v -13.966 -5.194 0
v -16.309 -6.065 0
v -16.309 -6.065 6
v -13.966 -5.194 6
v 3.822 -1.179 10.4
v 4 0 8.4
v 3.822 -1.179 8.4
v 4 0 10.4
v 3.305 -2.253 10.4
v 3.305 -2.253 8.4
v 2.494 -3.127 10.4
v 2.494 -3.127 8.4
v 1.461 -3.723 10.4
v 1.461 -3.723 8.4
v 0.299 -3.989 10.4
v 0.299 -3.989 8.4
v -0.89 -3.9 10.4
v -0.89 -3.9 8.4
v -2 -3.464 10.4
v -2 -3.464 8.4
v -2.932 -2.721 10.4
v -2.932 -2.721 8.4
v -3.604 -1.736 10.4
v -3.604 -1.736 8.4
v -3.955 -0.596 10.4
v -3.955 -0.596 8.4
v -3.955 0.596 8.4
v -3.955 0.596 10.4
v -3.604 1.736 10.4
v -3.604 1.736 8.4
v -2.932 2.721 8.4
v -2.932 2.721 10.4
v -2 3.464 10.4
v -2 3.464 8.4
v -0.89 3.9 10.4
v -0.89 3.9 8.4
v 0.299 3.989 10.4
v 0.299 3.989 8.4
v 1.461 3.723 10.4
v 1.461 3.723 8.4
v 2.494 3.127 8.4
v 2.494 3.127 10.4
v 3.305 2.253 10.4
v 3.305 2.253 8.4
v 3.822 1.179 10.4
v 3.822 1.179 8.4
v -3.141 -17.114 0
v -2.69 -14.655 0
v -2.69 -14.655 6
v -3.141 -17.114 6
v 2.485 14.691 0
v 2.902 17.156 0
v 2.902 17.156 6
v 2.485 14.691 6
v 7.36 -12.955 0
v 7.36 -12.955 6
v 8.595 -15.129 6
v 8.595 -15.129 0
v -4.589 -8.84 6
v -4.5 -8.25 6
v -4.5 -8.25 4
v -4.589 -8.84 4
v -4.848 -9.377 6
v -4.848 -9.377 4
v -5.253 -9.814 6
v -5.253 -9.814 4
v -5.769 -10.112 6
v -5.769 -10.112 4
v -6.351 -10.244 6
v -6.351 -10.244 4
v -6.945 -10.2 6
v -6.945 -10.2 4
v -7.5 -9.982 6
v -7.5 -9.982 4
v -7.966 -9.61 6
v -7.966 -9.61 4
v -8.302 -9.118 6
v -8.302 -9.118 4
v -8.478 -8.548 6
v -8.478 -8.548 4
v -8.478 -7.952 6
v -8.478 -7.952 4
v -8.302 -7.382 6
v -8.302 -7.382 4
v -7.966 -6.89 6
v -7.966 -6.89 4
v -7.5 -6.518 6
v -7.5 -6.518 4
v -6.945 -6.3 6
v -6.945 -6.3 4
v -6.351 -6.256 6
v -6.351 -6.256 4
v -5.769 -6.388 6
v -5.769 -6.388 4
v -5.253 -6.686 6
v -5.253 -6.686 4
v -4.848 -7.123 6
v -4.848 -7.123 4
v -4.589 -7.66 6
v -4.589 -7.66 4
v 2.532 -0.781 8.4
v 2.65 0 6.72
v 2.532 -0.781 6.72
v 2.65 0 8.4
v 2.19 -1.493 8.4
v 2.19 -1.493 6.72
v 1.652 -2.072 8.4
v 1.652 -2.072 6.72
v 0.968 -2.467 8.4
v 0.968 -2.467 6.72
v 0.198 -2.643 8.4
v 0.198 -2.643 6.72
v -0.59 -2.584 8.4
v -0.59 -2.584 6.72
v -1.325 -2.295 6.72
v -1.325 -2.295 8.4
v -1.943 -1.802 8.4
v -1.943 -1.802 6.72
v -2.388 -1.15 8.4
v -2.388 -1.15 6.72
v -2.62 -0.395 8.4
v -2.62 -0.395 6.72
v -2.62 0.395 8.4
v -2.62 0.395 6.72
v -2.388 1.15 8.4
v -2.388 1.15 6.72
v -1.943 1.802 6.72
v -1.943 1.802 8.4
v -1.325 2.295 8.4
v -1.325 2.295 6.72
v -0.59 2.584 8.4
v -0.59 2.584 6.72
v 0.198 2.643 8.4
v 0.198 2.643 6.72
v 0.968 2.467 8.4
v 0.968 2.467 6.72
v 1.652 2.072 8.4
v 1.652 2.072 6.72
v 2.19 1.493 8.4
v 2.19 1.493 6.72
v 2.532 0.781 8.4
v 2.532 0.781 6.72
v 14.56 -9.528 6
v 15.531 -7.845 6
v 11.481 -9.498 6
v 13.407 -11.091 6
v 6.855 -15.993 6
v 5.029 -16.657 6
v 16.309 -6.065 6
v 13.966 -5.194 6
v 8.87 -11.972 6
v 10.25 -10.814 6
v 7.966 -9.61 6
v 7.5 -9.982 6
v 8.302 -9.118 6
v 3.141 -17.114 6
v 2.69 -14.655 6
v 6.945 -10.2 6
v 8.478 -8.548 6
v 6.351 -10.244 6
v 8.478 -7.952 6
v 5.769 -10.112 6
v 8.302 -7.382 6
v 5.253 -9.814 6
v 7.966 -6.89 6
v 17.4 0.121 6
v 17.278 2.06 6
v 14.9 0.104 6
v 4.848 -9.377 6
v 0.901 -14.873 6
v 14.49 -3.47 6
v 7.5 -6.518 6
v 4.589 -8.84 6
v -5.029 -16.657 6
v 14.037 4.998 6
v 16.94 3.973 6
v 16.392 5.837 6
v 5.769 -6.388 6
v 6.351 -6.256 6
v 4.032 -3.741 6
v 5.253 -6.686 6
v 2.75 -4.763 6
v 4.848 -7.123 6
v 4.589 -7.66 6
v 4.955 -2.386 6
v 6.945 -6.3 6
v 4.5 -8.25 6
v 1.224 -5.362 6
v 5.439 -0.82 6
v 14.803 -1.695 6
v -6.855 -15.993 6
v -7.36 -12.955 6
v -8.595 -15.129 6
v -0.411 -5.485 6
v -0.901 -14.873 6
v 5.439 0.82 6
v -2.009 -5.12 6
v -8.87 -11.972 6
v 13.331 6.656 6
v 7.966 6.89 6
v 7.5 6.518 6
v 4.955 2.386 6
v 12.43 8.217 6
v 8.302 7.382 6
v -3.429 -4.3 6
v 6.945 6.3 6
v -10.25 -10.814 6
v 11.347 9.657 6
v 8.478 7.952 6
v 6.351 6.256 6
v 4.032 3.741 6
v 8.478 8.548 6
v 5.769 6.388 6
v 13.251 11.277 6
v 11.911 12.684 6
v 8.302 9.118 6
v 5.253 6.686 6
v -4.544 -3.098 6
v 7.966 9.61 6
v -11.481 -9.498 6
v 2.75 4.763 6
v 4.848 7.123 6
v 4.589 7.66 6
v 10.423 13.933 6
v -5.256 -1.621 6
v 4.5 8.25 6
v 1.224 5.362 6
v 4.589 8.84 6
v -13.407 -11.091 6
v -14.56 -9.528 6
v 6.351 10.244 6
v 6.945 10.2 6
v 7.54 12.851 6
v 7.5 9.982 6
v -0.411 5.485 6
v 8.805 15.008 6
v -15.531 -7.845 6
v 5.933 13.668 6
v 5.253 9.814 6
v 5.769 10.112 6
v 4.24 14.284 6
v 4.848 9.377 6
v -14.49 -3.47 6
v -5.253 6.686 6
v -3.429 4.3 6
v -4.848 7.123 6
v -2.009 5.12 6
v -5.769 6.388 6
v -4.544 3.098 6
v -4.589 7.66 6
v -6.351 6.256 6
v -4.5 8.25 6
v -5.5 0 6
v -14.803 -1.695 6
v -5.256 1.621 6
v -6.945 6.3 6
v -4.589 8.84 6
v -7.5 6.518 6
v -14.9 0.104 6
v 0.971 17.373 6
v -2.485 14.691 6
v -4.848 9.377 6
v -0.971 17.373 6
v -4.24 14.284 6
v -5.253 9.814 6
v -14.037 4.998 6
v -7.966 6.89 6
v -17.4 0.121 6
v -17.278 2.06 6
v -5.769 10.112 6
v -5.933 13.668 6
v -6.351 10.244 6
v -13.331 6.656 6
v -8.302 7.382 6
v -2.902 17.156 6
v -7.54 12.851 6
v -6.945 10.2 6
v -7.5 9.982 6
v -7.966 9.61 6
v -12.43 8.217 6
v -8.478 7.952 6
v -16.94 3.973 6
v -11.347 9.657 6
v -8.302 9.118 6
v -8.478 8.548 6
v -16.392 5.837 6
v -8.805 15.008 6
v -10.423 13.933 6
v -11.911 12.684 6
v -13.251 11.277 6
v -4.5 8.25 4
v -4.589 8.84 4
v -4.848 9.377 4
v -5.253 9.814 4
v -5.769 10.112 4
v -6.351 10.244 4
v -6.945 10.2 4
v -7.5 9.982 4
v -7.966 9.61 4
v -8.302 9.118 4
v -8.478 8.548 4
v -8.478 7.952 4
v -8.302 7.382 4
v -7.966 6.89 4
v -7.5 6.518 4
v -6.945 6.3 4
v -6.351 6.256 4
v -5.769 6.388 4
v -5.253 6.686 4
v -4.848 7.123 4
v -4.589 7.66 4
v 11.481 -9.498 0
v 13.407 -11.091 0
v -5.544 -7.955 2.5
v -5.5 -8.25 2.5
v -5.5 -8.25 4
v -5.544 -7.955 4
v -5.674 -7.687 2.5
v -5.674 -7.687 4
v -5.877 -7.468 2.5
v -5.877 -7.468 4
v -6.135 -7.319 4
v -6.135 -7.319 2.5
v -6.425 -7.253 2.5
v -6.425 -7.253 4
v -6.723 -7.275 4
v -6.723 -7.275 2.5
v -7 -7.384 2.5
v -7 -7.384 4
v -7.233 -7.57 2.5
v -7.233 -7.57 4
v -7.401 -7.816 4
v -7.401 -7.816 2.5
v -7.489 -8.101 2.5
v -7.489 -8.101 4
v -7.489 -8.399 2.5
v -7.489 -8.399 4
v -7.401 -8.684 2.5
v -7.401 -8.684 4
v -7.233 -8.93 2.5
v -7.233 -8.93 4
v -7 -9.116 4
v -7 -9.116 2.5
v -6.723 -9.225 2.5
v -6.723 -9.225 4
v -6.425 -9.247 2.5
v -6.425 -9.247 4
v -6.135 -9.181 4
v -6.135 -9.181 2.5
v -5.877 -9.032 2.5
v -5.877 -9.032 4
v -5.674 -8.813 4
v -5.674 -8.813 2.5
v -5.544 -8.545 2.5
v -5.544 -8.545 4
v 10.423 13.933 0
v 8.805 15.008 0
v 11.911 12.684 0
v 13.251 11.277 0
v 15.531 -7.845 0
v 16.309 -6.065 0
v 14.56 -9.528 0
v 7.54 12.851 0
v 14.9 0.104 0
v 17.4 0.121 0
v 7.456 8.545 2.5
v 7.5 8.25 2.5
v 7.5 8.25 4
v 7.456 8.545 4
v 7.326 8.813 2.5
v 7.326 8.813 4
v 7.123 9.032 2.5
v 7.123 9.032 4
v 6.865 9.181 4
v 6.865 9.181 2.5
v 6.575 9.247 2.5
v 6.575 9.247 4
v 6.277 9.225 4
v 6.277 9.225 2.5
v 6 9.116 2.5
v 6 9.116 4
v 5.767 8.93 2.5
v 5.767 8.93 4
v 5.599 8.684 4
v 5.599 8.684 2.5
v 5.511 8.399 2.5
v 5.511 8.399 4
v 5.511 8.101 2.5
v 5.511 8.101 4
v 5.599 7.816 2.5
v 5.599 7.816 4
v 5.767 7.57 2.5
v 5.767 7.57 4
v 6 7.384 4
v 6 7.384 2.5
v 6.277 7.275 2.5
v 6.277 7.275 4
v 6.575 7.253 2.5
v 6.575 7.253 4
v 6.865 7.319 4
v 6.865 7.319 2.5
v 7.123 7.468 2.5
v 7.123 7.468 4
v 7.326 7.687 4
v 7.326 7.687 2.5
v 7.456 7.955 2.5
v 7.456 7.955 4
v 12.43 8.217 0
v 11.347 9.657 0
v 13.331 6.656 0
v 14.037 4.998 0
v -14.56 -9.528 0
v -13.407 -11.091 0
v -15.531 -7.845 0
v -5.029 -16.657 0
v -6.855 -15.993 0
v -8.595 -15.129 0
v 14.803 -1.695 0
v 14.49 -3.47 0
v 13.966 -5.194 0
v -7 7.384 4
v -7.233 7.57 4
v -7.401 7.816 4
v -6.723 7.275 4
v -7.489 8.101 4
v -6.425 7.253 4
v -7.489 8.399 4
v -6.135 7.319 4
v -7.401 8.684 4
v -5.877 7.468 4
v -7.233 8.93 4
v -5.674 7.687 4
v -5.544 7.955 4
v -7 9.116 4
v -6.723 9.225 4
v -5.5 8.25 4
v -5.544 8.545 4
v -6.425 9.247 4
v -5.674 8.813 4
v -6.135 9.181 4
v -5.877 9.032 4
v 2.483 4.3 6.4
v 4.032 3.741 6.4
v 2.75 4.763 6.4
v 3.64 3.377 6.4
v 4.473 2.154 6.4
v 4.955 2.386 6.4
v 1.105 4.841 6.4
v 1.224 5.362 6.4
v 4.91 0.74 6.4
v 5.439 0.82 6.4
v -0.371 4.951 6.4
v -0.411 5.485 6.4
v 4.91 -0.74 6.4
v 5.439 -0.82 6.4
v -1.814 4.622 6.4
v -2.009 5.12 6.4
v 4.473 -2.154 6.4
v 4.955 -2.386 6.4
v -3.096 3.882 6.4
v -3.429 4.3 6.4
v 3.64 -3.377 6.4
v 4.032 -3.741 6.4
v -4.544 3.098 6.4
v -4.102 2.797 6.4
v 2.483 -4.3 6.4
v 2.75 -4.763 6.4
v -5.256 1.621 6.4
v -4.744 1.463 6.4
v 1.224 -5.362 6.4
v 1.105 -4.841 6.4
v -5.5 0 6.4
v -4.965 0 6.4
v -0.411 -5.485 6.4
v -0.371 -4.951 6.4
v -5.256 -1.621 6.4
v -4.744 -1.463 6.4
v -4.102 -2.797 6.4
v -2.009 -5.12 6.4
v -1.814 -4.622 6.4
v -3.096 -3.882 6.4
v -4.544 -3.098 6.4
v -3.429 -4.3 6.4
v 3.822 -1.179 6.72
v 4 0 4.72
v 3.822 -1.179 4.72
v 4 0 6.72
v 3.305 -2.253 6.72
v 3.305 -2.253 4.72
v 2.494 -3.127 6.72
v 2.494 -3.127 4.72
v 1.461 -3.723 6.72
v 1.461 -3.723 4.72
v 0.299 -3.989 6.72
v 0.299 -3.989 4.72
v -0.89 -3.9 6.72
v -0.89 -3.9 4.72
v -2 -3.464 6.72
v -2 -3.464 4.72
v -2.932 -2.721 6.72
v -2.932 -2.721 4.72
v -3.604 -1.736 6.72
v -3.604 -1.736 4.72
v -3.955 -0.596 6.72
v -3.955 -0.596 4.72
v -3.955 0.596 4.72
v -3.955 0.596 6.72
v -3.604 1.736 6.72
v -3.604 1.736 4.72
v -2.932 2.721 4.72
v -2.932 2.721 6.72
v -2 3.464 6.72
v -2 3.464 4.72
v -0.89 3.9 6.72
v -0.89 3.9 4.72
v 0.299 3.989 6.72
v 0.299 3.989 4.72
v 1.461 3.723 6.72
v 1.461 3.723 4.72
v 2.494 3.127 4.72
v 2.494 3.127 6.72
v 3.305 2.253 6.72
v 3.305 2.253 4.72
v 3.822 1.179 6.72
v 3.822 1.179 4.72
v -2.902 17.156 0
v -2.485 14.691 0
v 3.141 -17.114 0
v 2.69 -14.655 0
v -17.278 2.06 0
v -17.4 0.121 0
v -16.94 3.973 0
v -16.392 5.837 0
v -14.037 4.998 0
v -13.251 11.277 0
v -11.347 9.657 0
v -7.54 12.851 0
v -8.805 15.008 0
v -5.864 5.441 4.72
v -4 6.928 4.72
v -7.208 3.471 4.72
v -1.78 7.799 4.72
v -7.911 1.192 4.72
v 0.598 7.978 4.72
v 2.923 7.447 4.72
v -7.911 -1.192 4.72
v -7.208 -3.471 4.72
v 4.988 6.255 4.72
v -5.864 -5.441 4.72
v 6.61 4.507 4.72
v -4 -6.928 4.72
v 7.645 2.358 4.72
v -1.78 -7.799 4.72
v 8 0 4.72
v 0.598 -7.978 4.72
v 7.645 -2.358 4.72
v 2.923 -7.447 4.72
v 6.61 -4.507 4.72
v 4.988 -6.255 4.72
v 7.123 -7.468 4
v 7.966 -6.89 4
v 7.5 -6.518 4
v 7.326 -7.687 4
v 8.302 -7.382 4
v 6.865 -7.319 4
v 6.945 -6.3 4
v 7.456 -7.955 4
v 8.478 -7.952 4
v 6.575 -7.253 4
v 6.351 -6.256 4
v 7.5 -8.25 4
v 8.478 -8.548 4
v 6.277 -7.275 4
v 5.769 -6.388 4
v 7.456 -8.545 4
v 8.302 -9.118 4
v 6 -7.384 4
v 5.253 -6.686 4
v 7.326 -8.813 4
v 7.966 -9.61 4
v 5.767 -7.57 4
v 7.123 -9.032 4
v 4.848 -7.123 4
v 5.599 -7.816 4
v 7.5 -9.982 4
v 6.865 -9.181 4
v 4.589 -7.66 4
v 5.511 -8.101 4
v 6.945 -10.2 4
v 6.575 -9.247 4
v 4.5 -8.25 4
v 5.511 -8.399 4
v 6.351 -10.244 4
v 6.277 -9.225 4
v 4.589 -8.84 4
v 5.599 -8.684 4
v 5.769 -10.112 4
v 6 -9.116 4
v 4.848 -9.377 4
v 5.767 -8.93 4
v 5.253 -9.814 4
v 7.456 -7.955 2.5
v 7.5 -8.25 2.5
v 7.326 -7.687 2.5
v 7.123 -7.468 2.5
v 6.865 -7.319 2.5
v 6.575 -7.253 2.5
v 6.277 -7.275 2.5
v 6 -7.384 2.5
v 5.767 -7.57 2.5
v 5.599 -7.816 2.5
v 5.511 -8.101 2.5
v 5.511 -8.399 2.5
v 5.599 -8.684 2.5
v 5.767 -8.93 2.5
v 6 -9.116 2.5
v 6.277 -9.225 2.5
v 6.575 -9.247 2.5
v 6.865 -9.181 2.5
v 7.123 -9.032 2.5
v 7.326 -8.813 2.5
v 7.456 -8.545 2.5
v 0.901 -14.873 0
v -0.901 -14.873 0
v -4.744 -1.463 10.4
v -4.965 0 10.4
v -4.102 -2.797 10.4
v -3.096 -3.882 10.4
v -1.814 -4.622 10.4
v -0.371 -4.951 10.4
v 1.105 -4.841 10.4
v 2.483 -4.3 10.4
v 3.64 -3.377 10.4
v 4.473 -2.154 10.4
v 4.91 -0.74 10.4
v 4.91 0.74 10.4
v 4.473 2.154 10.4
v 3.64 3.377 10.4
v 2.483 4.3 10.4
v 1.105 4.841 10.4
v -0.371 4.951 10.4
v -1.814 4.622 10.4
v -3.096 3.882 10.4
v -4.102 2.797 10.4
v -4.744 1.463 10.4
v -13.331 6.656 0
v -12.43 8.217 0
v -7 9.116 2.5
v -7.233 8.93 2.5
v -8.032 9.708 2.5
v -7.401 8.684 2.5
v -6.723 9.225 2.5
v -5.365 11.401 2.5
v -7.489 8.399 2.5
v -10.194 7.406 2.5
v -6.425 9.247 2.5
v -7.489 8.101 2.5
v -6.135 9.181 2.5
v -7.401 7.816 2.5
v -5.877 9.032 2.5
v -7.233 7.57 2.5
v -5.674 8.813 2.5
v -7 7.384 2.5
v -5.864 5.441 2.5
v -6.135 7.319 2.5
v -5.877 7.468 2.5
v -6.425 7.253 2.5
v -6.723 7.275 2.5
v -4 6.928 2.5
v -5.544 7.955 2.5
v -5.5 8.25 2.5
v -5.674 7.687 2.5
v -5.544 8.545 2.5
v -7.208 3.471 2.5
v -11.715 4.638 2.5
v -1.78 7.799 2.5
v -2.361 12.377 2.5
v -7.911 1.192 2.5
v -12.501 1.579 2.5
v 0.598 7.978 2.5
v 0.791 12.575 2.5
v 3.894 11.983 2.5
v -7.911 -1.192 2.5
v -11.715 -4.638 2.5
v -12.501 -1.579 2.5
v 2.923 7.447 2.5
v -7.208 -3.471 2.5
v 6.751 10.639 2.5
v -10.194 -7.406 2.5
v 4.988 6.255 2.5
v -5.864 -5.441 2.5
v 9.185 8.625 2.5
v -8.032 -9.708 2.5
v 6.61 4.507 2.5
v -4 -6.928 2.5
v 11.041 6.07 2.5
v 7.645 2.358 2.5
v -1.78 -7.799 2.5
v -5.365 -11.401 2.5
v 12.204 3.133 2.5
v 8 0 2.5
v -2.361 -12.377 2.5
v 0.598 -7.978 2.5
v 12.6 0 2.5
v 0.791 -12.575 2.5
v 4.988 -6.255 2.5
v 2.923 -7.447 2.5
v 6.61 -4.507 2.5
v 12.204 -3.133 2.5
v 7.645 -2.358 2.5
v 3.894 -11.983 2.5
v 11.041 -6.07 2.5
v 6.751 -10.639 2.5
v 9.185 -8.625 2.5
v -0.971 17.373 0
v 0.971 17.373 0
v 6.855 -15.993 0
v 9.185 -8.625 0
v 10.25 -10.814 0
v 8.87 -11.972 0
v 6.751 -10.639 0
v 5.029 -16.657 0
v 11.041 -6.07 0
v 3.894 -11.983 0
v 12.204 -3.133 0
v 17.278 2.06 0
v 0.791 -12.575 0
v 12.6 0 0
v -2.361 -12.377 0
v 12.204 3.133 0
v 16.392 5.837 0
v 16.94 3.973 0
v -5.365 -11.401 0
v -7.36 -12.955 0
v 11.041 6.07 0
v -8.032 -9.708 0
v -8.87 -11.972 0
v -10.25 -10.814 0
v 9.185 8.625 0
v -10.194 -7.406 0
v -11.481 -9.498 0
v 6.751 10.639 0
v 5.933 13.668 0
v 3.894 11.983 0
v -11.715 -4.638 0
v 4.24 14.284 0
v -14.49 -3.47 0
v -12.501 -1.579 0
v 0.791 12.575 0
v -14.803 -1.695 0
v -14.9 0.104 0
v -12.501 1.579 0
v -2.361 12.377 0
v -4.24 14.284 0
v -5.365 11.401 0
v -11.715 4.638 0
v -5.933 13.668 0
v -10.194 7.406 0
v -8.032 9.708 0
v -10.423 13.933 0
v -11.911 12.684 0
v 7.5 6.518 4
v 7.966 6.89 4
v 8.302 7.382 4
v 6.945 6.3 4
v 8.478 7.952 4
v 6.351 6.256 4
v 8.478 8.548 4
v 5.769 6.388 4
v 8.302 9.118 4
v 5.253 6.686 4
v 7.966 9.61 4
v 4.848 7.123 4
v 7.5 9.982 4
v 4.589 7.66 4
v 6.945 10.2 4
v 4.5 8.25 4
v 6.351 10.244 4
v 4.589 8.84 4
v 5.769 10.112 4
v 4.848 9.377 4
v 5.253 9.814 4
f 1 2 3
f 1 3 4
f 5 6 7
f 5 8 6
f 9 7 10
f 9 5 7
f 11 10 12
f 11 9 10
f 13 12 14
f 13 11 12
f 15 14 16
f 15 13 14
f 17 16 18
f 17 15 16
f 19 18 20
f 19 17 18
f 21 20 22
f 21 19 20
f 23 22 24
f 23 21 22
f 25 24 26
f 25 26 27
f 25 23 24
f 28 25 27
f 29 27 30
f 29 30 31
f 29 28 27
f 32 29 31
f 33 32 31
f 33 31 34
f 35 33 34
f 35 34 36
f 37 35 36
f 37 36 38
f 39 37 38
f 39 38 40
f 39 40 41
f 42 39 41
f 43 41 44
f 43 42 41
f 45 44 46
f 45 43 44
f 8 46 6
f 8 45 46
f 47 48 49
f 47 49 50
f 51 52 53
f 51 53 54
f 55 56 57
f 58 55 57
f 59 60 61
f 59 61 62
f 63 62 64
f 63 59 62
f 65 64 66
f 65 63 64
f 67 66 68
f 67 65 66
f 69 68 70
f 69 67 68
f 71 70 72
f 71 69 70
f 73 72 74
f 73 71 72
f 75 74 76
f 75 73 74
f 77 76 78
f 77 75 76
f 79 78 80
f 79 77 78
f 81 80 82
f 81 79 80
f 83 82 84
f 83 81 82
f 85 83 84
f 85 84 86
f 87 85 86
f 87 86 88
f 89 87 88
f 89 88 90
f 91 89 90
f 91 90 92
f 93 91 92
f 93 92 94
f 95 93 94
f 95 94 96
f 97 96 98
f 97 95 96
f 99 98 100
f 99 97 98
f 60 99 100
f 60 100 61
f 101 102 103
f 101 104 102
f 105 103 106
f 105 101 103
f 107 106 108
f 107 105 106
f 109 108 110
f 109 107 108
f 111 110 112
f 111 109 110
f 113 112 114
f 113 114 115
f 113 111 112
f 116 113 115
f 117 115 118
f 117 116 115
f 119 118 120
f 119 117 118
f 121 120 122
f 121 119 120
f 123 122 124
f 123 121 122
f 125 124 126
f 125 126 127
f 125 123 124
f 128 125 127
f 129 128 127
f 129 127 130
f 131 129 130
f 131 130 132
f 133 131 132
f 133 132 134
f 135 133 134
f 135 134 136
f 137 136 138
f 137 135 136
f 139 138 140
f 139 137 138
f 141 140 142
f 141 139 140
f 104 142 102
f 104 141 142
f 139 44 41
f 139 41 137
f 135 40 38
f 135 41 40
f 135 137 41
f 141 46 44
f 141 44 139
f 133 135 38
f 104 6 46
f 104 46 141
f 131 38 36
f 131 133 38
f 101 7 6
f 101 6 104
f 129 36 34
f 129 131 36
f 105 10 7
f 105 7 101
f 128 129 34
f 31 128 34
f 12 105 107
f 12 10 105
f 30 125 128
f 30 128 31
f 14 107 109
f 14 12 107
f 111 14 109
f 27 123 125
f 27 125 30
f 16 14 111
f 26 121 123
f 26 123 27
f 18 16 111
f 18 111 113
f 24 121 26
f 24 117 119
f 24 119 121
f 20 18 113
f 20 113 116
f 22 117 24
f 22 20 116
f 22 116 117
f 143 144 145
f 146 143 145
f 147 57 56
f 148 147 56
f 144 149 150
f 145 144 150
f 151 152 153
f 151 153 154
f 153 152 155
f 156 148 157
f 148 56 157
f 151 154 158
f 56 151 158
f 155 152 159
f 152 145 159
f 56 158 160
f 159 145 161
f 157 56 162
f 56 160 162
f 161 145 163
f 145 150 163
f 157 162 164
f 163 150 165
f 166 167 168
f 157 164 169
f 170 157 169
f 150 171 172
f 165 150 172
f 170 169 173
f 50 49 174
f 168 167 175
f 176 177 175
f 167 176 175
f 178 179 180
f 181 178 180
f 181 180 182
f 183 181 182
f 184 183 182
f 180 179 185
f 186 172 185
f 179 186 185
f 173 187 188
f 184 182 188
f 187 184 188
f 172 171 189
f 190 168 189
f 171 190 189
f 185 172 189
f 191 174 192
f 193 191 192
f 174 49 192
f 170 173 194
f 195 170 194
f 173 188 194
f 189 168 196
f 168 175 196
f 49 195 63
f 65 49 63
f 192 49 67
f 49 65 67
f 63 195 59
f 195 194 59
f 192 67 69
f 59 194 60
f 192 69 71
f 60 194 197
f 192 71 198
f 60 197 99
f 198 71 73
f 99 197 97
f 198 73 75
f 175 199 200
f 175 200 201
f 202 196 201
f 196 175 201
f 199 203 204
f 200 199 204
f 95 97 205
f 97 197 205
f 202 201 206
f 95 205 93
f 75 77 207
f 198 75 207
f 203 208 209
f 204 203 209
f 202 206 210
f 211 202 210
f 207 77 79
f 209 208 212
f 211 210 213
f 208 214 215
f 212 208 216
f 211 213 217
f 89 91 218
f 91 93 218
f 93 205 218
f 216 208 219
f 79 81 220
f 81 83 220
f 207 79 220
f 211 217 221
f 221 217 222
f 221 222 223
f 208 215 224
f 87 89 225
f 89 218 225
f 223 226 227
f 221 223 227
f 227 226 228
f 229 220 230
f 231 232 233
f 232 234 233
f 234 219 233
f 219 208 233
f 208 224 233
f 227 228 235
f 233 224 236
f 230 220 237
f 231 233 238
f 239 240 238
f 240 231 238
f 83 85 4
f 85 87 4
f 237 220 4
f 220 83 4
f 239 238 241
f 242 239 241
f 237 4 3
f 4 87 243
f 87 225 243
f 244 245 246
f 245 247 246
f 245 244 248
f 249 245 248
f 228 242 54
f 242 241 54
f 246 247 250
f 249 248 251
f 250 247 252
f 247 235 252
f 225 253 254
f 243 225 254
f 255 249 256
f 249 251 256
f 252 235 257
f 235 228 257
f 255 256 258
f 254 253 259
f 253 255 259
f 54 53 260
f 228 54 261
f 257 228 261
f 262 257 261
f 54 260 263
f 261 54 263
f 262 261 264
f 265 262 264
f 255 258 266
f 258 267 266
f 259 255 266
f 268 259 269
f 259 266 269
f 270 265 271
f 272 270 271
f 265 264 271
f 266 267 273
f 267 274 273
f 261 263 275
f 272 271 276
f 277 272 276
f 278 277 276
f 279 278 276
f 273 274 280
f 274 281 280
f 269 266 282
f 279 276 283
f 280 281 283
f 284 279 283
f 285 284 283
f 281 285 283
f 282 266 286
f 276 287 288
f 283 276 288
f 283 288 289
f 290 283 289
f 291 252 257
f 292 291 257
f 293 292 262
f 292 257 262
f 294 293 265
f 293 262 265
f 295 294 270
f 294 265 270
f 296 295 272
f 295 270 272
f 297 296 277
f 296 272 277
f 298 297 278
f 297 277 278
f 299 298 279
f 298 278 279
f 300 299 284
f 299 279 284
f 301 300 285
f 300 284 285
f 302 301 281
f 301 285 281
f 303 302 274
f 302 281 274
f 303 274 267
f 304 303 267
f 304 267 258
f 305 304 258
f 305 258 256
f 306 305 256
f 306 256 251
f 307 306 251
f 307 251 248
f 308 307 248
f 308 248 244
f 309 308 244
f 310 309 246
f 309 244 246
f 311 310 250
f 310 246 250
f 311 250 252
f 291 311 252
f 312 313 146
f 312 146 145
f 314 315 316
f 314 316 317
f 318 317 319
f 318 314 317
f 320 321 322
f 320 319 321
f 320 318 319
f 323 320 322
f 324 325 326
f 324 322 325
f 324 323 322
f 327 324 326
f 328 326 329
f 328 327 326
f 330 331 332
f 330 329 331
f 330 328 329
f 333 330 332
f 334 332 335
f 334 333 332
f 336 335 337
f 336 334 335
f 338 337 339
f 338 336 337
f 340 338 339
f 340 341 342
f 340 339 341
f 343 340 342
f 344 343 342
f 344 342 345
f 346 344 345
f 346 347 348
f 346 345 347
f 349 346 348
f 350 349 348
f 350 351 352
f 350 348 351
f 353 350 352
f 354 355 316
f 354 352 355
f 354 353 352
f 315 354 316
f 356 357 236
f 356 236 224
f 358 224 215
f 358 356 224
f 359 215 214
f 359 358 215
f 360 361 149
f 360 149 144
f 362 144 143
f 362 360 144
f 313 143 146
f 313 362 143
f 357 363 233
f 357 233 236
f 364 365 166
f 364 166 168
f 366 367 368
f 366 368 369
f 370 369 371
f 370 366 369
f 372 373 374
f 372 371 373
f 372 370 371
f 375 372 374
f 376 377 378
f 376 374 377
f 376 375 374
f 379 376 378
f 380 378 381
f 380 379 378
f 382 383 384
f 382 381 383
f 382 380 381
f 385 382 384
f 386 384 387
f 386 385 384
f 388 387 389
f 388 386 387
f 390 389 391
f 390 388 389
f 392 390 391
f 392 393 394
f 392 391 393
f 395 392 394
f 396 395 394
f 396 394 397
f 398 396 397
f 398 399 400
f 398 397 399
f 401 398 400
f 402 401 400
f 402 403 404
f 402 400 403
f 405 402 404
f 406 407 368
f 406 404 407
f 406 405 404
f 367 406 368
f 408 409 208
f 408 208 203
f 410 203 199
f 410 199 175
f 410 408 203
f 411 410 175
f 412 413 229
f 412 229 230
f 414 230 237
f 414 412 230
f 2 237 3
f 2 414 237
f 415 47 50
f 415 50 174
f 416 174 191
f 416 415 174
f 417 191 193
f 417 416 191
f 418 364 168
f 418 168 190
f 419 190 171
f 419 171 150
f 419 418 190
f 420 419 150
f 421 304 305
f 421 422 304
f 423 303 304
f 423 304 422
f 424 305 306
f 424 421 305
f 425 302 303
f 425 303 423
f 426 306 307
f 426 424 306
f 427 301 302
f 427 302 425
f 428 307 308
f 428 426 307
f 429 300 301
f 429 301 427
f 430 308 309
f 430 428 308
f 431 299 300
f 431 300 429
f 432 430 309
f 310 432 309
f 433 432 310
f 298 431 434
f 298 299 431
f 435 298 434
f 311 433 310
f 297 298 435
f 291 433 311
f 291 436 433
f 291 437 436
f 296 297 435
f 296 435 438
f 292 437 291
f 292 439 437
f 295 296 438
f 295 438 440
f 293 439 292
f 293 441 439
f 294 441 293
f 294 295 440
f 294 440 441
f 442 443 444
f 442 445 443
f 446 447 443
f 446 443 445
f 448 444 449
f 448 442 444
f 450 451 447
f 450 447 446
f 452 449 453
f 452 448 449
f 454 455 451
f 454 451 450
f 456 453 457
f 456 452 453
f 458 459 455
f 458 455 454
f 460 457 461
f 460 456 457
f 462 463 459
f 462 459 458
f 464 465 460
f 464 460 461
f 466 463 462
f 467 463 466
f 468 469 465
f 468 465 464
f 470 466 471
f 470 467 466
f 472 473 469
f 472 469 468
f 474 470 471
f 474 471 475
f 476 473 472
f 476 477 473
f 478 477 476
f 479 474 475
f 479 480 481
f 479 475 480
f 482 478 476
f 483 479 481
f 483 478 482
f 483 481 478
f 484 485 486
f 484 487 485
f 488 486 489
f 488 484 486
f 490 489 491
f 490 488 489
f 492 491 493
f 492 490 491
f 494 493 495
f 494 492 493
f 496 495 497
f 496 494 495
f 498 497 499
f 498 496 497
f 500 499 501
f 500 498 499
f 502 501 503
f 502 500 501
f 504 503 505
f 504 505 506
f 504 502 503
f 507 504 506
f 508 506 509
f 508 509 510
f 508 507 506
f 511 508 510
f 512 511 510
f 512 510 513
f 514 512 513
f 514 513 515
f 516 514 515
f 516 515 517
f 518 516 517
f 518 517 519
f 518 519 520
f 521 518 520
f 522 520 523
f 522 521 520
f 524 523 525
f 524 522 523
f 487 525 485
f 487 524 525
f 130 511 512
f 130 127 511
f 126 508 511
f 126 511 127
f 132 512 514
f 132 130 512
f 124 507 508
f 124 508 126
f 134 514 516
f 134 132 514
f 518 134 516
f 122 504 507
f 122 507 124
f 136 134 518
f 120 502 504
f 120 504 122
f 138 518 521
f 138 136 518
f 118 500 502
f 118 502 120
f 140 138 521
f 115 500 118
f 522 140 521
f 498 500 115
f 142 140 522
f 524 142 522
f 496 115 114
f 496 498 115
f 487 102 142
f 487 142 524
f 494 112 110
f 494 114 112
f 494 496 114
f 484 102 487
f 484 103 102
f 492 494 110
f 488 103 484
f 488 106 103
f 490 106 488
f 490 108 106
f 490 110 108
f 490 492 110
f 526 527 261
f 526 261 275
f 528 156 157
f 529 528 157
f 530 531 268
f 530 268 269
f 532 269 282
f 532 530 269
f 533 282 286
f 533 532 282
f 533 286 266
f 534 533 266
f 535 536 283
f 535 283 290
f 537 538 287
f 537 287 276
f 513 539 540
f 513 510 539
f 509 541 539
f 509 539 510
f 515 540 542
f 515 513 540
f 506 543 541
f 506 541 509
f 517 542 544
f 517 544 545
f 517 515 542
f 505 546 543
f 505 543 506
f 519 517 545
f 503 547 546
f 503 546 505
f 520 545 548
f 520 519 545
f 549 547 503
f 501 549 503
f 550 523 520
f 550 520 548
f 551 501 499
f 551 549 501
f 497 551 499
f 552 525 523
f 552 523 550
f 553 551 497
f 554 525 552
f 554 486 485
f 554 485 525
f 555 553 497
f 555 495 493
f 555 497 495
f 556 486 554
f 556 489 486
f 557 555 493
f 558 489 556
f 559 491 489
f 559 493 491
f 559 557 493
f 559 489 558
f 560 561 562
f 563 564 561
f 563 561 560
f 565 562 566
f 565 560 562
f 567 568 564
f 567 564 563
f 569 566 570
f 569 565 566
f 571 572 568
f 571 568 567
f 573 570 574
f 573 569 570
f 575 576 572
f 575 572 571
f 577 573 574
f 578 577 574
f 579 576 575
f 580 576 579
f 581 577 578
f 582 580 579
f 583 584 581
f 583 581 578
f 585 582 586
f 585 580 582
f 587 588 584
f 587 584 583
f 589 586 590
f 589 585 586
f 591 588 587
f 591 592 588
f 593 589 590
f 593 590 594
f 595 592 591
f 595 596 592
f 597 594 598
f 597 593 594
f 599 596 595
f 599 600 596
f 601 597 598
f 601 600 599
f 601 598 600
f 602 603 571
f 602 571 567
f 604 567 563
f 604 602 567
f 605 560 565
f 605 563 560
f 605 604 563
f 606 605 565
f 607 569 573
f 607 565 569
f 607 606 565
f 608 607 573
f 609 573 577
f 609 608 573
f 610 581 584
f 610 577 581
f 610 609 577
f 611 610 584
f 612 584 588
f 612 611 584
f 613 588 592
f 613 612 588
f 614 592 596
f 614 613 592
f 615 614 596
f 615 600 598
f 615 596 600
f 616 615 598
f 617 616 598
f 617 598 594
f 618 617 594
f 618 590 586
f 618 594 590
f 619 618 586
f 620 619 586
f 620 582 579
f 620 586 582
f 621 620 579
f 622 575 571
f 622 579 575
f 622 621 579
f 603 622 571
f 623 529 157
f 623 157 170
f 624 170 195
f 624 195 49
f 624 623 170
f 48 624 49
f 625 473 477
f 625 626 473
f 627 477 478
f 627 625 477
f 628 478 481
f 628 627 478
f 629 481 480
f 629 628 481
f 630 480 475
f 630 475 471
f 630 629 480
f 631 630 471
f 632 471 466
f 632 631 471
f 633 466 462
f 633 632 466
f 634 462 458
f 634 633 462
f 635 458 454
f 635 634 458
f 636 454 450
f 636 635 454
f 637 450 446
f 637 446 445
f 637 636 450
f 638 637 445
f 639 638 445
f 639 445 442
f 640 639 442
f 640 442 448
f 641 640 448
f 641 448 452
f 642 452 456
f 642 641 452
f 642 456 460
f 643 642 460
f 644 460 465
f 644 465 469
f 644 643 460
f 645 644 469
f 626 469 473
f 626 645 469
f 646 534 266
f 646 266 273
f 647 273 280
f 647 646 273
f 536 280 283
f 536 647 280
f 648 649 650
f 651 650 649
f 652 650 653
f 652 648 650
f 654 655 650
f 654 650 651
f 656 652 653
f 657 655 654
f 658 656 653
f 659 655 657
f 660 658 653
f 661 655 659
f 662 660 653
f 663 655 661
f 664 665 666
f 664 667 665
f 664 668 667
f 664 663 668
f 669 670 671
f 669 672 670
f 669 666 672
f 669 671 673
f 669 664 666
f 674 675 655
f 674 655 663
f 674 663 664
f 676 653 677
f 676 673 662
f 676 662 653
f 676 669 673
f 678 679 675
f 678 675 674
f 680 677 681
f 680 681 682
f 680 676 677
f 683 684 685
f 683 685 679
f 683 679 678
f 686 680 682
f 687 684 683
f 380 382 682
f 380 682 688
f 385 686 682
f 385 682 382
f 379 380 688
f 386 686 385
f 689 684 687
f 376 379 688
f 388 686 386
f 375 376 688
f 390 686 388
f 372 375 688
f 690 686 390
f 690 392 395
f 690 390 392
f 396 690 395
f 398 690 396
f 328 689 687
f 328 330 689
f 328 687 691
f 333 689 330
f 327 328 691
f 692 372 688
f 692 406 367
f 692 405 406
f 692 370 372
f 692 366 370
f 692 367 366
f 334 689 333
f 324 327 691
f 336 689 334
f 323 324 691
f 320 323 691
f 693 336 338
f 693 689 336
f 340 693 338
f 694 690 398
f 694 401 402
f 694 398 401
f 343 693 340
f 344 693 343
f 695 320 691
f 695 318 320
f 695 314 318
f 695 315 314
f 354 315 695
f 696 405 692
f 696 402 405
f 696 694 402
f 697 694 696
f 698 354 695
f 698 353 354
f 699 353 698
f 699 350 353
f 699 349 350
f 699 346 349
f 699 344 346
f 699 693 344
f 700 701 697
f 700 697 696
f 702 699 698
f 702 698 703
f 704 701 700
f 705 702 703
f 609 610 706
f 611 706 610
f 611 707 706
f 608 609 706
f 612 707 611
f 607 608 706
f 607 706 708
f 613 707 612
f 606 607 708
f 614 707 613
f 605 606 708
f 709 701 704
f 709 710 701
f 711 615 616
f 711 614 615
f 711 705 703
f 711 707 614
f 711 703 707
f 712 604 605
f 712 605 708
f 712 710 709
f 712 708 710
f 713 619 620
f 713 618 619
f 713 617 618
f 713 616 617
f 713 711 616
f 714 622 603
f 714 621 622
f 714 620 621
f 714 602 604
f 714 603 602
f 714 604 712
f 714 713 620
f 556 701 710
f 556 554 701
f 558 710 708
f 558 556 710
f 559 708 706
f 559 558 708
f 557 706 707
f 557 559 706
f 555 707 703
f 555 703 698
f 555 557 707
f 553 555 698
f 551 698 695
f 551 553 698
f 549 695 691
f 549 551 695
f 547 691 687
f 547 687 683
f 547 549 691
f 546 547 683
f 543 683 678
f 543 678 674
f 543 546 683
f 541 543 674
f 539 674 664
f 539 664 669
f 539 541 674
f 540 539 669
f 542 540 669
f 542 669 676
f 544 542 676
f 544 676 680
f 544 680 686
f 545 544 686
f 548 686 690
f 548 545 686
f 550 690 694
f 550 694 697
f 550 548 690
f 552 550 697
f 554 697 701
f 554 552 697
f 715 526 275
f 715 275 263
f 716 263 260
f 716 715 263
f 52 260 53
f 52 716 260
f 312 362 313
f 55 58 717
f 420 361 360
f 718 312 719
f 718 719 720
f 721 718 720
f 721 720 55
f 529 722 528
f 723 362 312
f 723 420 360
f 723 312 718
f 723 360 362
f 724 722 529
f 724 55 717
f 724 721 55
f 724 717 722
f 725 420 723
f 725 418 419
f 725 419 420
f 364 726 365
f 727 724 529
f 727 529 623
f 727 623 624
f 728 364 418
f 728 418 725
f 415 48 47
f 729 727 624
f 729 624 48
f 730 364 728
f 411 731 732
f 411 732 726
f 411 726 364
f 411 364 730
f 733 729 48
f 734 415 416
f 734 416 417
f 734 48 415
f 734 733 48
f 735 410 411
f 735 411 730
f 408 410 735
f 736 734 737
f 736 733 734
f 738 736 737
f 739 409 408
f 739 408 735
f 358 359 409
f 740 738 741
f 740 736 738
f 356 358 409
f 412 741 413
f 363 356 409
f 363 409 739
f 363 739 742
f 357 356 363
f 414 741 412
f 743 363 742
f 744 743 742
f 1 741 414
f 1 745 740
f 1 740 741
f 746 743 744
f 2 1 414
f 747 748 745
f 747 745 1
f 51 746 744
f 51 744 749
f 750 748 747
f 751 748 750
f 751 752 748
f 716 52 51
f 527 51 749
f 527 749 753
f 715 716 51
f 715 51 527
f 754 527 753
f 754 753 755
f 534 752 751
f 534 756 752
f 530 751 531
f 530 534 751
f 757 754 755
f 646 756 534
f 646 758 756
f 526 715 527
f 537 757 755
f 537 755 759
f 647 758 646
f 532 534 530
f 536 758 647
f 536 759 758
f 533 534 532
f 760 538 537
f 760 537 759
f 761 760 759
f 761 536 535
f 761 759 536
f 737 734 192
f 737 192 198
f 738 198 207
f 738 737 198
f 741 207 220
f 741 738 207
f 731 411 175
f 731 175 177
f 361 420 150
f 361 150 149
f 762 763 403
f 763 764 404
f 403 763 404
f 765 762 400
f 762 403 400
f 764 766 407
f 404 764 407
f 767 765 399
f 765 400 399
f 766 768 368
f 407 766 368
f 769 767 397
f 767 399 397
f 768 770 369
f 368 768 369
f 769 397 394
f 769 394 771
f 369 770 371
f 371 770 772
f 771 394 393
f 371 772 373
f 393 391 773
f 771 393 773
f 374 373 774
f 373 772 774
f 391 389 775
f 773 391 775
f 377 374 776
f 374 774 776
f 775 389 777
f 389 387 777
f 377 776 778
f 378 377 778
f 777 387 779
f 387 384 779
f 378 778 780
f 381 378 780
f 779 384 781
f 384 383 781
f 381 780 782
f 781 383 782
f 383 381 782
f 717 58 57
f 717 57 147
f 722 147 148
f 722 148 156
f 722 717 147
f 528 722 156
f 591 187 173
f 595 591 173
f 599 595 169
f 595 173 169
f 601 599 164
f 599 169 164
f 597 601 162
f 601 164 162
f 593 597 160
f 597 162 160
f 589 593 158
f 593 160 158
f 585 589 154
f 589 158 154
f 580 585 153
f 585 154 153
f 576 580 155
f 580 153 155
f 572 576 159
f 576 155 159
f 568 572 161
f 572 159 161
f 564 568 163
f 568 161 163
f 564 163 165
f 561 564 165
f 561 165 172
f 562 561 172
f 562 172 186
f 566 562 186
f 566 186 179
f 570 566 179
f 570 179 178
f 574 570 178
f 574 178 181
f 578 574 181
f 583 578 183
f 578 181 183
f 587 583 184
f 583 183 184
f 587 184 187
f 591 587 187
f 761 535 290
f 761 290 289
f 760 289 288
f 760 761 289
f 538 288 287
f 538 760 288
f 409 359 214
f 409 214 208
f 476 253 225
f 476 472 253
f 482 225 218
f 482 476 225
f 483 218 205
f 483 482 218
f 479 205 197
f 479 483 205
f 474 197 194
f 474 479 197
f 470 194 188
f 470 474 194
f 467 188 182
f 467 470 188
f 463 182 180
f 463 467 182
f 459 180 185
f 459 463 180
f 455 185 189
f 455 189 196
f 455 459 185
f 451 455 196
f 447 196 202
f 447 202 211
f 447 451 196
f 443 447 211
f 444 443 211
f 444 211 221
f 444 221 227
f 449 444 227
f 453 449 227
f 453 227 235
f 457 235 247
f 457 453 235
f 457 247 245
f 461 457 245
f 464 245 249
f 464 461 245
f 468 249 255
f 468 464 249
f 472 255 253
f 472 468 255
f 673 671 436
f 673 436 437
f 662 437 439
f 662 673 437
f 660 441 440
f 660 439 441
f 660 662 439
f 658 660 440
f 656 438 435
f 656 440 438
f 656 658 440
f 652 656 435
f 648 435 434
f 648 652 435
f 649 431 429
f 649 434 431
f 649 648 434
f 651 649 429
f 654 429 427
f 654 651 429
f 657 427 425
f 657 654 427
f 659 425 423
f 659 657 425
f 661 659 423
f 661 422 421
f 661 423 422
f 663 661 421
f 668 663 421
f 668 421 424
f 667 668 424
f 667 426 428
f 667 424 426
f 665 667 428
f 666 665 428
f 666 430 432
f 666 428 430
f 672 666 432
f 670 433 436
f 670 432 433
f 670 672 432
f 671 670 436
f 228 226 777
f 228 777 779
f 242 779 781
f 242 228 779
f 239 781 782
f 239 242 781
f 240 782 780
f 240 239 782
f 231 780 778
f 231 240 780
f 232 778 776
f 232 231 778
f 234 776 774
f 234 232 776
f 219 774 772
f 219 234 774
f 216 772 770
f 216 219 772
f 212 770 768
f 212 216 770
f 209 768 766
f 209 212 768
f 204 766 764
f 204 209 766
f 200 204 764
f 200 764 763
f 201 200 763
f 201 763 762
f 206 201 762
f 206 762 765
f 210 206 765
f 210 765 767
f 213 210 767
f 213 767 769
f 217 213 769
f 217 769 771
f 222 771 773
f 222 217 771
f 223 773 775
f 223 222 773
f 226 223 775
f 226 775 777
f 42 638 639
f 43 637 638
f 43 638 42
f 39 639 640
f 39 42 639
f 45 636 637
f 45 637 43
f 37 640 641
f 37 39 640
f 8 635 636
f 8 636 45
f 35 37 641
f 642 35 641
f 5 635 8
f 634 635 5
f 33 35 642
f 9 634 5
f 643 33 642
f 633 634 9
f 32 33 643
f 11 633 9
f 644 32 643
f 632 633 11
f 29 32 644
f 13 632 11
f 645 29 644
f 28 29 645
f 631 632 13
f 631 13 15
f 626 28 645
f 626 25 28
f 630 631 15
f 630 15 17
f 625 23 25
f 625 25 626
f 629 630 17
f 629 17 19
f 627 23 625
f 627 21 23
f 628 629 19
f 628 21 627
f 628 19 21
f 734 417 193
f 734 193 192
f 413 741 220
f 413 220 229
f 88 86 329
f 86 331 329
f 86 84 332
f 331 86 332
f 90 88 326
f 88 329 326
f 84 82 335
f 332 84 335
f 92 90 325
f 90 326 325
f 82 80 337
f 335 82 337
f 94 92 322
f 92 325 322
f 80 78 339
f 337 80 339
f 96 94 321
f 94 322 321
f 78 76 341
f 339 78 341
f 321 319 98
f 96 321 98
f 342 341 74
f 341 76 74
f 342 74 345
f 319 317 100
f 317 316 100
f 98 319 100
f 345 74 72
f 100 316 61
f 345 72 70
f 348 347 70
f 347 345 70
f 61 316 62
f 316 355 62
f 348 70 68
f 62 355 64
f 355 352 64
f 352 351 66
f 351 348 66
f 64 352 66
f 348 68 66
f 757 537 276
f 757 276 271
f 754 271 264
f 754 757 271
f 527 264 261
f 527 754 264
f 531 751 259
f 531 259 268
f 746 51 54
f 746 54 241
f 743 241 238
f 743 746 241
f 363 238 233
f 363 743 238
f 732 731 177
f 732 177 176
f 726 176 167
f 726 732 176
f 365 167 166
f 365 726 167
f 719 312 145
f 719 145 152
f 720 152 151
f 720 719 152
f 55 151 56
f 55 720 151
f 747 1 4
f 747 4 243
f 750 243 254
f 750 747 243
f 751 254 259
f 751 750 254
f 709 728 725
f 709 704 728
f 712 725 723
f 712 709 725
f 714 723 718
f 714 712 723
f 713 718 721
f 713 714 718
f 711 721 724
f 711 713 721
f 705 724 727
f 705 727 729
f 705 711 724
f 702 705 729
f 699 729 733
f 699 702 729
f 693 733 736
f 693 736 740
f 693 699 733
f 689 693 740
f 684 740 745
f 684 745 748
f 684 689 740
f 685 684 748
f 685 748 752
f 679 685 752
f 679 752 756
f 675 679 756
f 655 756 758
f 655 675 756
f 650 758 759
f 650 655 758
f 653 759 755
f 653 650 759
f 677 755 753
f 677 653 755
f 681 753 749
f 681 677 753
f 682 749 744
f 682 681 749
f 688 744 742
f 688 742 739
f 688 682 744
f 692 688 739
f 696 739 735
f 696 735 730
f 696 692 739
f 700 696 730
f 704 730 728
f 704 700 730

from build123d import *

# Parameters (mm, degrees)
ESQUISSE1_R               = 1
BOSS_EXTRU_2_DEPTH        = 6
ESQUISSE5_R               = 2
ENL_V_MAT_EXTRU_1_DEPTH   = 2
SYM_TRIE2_COPY_1_SKETCH_R = 2
SYM_TRIE2_COPY_1_DEPTH    = 2


with BuildPart() as part:
    # Esquisse1 → Boss.-Extru.2 (new body)
    with BuildSketch(Plane.XY):
        with BuildLine():
            Line((-8.804987496, 15.007737844), (-7.539903085, 12.851453671))
            ThreePointArc((-7.539903085, 12.851453671), (-5.096100136, 14.00142005), (-2.484854326, 14.691340952))
            Line((-2.484854326, 14.691340952), (-2.901776193, 17.156331045))
            ThreePointArc((-2.901776193, 17.156331045), (0, 17.4), (2.901776193, 17.156331045))
            Line((2.901776193, 17.156331045), (2.484854326, 14.691340952))
            ThreePointArc((2.484854326, 14.691340952), (5.096100136, 14.00142005), (7.539903085, 12.851453671))
            Line((7.539903085, 12.851453671), (8.804987496, 15.007737844))
            ThreePointArc((8.804987496, 15.007737844), (11.184504409, 13.32917331), (13.250766551, 11.277286278))
            Line((13.250766551, 11.277286278), (11.346920782, 9.656986526))
            ThreePointArc((11.346920782, 9.656986526), (12.903778516, 7.45), (14.036656047, 4.998228389))
            Line((14.036656047, 4.998228389), (16.391799678, 5.836857314))
            ThreePointArc((16.391799678, 5.836857314), (17.135654902, 3.021478291), (17.399575974, 0.121473929))
            Line((17.399575974, 0.121473929), (14.899636898, 0.104020778))
            ThreePointArc((14.899636898, 0.104020778), (14.67363552, -2.587357847), (13.965501643, -5.193723505))
            Line((13.965501643, -5.193723505), (16.308706617, -6.065153623))
            ThreePointArc((16.308706617, -6.065153623), (15.068842026, -8.7), (13.406930424, -11.091177422))
            Line((13.406930424, -11.091177422), (11.480647317, -9.497617447))
            ThreePointArc((11.480647317, -9.497617447), (9.577535384, -11.414062202), (7.359733812, -12.95547445))
            Line((7.359733812, -12.95547445), (8.594588479, -15.129211773))
            ThreePointArc((8.594588479, -15.129211773), (5.951150494, -16.350651602), (3.141033127, -17.114143592))
            Line((3.141033127, -17.114143592), (2.689735264, -14.655214915))
            ThreePointArc((2.689735264, -14.655214915), (0, -14.9), (-2.689735264, -14.655214915))
            Line((-2.689735264, -14.655214915), (-3.141033127, -17.114143592))
            ThreePointArc((-3.141033127, -17.114143592), (-5.951150494, -16.350651602), (-8.594588479, -15.129211773))
            Line((-8.594588479, -15.129211773), (-7.359733812, -12.95547445))
            ThreePointArc((-7.359733812, -12.95547445), (-9.577535384, -11.414062202), (-11.480647317, -9.497617447))
            Line((-11.480647317, -9.497617447), (-13.406930424, -11.091177422))
            ThreePointArc((-13.406930424, -11.091177422), (-15.068842026, -8.7), (-16.308706617, -6.065153623))
            Line((-16.308706617, -6.065153623), (-13.965501643, -5.193723505))
            ThreePointArc((-13.965501643, -5.193723505), (-14.67363552, -2.587357847), (-14.899636898, 0.104020778))
            Line((-14.899636898, 0.104020778), (-17.399575974, 0.121473929))
            ThreePointArc((-17.399575974, 0.121473929), (-17.135654902, 3.021478291), (-16.391799678, 5.836857314))
            Line((-16.391799678, 5.836857314), (-14.036656047, 4.998228389))
            ThreePointArc((-14.036656047, 4.998228389), (-12.903778516, 7.45), (-11.346920782, 9.656986526))
            Line((-11.346920782, 9.656986526), (-13.250766551, 11.277286278))
            ThreePointArc((-13.250766551, 11.277286278), (-11.184504409, 13.32917331), (-8.804987496, 15.007737844))
        make_face()
        with Locations((-6.5, -8.25)):
            Circle(ESQUISSE1_R, mode=Mode.SUBTRACT)
        with Locations((-6.5, 8.25)):
            Circle(ESQUISSE1_R, mode=Mode.SUBTRACT)
        with Locations((6.5, -8.25)):
            Circle(ESQUISSE1_R, mode=Mode.SUBTRACT)
        with Locations((6.5, 8.25)):
            Circle(ESQUISSE1_R, mode=Mode.SUBTRACT)
    extrude(amount=BOSS_EXTRU_2_DEPTH)

    # Esquisse3 → Révolution1 (revolve)
    with BuildSketch(Plane(origin=(0, 0, 0), x_dir=(1, 0, 0), z_dir=(0, 1, 0))):
        Polygon((0, -6), (-5.5, -6), (-5.5, -6.4), (-4.965, -6.4), (-4.965, -10.4), (0, -10.4), align=None)
    revolve(axis=Axis((0, 0, -3.652866049), (0, 0, 1)))

    # Esquisse4 → Enlèvement de matière-Révolution1 (revolve, cut)
    with BuildSketch(Plane(origin=(0, 0, 0), x_dir=(1, 0, 0), z_dir=(0, 1, 0)), mode=Mode.PRIVATE) as enl_vement_de_mati_re_r_volution1_sk:
        Polygon((-2.65, -6.72), (-2.65, -8.4), (-4, -8.4), (-4, -10.4), (0, -10.4), (0, 0), (-12.6, 0), (-12.6, -2.5), (-8, -2.5), (-8, -4.72), (-4, -4.72), (-4, -6.72), align=None)
    revolve(enl_vement_de_mati_re_r_volution1_sk.sketch.rotate(Axis((0, 0, 13.157502932), (0, 0, -1)), 180), axis=Axis((0, 0, 13.157502932), (0, 0, -1)), mode=Mode.SUBTRACT)

    # Esquisse5 → Enlèv. mat.-Extru.1 (cut)
    with BuildSketch(Plane.XY.offset(6)):
        with Locations((-6.5, 8.25)):
            Circle(ESQUISSE5_R)
    enl_v_mat_extru_1 = extrude(amount=-ENL_V_MAT_EXTRU_1_DEPTH, mode=Mode.SUBTRACT)

    # Symétrie1: Enlèv. mat.-Extru.1 across plane
    add(enl_v_mat_extru_1.mirror(Plane.ZX), mode=Mode.SUBTRACT)

    # Symétrie2: Enlèv. mat.-Extru.1 across plane
    add(enl_v_mat_extru_1.mirror(Plane(origin=(0, 0, 0), x_dir=(0, 0, 1), z_dir=(1, 0, 0))), mode=Mode.SUBTRACT)

    # Symétrie2 copy 1 sketch → Symétrie2 copy 1 (cut)
    with BuildSketch(Plane(origin=(0, 0, 6), x_dir=(-1, 0, 0), z_dir=(0, 0, 1))):
        with Locations((-6.5, 8.25)):
            Circle(SYM_TRIE2_COPY_1_SKETCH_R)
    extrude(amount=-SYM_TRIE2_COPY_1_DEPTH, mode=Mode.SUBTRACT)


solid = part.part
